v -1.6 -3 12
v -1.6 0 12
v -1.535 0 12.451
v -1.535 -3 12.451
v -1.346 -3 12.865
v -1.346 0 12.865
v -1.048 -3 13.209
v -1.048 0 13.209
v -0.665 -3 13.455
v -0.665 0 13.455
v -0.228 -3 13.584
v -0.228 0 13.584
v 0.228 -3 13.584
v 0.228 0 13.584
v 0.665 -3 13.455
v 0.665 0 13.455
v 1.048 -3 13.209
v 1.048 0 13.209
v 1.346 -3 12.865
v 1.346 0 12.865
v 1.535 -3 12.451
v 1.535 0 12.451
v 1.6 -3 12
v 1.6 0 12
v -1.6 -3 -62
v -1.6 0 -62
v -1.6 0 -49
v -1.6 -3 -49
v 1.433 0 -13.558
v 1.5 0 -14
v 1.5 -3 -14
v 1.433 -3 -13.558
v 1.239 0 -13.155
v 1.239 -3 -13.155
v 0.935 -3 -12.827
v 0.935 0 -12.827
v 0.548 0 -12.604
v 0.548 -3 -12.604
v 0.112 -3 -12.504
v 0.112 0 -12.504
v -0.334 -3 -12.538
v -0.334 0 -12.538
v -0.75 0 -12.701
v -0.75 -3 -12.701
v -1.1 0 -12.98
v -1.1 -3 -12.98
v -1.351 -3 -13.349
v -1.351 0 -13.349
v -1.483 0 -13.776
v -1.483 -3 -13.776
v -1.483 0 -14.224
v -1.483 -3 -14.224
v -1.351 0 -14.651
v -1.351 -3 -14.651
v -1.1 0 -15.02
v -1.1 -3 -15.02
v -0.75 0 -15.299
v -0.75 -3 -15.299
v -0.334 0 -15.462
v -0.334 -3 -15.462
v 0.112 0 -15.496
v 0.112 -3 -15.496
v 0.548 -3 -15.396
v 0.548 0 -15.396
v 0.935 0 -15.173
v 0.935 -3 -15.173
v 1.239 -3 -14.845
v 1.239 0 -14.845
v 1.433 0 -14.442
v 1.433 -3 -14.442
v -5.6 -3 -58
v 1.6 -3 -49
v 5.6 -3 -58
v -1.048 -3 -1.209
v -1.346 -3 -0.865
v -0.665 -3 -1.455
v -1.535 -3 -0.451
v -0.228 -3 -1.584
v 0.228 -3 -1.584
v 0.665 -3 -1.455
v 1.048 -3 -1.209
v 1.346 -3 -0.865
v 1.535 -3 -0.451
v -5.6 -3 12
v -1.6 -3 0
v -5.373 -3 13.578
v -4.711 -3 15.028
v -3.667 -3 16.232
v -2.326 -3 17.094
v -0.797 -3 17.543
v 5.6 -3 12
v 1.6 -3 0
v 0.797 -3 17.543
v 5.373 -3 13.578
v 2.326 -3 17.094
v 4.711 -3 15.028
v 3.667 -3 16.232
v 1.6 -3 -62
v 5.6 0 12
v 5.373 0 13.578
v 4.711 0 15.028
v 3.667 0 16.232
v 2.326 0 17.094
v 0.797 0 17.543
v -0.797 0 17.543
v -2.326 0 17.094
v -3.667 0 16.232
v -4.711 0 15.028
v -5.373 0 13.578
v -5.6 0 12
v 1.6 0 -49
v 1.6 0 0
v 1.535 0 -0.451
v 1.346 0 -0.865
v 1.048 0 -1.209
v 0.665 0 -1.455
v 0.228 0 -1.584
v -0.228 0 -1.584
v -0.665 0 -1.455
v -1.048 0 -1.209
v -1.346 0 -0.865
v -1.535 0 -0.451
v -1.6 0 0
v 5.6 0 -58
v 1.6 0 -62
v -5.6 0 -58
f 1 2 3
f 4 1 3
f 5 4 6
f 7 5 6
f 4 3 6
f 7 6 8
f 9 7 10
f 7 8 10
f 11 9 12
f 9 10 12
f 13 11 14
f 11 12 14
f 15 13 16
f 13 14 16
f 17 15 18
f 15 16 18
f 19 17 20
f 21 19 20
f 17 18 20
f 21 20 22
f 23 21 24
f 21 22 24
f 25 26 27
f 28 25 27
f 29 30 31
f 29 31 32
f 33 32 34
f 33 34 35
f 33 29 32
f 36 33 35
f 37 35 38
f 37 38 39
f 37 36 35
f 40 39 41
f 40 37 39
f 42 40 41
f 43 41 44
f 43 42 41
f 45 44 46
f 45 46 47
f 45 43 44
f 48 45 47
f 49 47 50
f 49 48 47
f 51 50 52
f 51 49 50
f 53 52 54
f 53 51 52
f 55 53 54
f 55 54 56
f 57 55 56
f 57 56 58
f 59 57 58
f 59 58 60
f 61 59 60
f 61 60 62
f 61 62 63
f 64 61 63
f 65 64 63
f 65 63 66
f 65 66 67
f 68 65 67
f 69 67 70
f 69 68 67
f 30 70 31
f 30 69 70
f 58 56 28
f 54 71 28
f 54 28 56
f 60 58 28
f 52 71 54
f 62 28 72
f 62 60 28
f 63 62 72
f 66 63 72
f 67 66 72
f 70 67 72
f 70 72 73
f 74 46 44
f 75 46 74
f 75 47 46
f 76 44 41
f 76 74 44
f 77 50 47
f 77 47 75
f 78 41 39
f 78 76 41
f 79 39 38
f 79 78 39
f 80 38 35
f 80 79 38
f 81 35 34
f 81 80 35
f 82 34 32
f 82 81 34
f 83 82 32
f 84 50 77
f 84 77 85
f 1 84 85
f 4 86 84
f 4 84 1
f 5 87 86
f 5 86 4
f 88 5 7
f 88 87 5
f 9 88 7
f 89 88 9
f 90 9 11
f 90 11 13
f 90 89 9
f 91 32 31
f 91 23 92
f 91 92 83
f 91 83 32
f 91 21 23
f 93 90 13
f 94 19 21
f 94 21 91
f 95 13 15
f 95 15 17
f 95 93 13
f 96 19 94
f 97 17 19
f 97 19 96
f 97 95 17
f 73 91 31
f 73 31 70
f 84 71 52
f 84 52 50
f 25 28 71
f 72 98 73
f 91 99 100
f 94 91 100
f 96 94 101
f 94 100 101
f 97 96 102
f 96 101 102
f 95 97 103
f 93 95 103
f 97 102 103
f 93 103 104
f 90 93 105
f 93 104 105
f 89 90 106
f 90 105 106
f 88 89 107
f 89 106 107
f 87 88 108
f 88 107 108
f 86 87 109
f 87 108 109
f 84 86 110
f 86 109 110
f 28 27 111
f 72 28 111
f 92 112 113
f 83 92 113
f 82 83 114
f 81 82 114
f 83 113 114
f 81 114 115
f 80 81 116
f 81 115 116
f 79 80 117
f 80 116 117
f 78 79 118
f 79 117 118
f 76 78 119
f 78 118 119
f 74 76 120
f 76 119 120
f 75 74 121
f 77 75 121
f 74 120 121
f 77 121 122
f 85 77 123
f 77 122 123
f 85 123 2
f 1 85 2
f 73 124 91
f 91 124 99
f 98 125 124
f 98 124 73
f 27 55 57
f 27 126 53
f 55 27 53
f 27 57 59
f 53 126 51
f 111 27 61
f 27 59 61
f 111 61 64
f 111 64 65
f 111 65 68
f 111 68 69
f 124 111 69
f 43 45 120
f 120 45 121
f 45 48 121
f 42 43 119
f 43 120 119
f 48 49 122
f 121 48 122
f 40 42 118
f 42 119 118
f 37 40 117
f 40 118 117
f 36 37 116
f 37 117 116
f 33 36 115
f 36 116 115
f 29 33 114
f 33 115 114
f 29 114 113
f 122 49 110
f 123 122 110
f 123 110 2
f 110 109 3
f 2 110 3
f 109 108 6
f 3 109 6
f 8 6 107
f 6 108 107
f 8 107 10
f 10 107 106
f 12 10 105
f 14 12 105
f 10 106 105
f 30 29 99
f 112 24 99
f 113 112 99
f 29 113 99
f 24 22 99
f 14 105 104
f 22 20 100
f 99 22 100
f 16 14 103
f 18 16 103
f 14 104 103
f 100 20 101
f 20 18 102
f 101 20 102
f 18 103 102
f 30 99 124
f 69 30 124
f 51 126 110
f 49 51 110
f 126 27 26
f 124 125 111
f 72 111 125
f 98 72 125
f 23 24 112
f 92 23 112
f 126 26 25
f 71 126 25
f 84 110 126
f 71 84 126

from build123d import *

# Parameters (mm, degrees)
F0_R     = 1.5
F1_DEPTH = 3
F2_SIZE  = 3.99999


# Not quite as in the source:
# - a fillet or chamfer is up to 0.001 mm smaller than in the source, because OpenCascade refuses the exact size


with BuildPart() as f1:
    # F0 (on Front) → F1 (new body)
    with BuildSketch(Plane.XZ):
        with BuildLine():
            Line((5.6, -62), (5.6, 12))
            ThreePointArc((5.6, 12), (0, 17.6), (-5.6, 12))
            Line((-5.6, 12), (-5.6, -62))
            Line((-5.6, -62), (-1.6, -62))
            Line((-1.6, -62), (-1.6, -49))
            Line((-1.6, -49), (1.6, -49))
            Line((1.6, -49), (1.6, -62))
            Line((1.6, -62), (5.6, -62))
        make_face()
        with Locations((0, -14)):
            Circle(F0_R, mode=Mode.SUBTRACT)
        with BuildLine():
            ThreePointArc((1.6, 0), (0, -1.6), (-1.6, 0))
            Line((-1.6, 0), (-1.6, 12))
            ThreePointArc((-1.6, 12), (0, 13.6), (1.6, 12))
            Line((1.6, 12), (1.6, 0))
        make_face(mode=Mode.SUBTRACT)
    extrude(amount=F1_DEPTH)

    # F2 (size 4 in the source; OpenCascade refuses exactly that, so slightly less here)
    f2_edges = [f1.edges().sort_by_distance(p)[0] for p in [
        (5.6, -1.5, -62),
        (-5.6, -1.5, -62),
    ]]
    chamfer(f2_edges, length=F2_SIZE)


solid = f1.part
